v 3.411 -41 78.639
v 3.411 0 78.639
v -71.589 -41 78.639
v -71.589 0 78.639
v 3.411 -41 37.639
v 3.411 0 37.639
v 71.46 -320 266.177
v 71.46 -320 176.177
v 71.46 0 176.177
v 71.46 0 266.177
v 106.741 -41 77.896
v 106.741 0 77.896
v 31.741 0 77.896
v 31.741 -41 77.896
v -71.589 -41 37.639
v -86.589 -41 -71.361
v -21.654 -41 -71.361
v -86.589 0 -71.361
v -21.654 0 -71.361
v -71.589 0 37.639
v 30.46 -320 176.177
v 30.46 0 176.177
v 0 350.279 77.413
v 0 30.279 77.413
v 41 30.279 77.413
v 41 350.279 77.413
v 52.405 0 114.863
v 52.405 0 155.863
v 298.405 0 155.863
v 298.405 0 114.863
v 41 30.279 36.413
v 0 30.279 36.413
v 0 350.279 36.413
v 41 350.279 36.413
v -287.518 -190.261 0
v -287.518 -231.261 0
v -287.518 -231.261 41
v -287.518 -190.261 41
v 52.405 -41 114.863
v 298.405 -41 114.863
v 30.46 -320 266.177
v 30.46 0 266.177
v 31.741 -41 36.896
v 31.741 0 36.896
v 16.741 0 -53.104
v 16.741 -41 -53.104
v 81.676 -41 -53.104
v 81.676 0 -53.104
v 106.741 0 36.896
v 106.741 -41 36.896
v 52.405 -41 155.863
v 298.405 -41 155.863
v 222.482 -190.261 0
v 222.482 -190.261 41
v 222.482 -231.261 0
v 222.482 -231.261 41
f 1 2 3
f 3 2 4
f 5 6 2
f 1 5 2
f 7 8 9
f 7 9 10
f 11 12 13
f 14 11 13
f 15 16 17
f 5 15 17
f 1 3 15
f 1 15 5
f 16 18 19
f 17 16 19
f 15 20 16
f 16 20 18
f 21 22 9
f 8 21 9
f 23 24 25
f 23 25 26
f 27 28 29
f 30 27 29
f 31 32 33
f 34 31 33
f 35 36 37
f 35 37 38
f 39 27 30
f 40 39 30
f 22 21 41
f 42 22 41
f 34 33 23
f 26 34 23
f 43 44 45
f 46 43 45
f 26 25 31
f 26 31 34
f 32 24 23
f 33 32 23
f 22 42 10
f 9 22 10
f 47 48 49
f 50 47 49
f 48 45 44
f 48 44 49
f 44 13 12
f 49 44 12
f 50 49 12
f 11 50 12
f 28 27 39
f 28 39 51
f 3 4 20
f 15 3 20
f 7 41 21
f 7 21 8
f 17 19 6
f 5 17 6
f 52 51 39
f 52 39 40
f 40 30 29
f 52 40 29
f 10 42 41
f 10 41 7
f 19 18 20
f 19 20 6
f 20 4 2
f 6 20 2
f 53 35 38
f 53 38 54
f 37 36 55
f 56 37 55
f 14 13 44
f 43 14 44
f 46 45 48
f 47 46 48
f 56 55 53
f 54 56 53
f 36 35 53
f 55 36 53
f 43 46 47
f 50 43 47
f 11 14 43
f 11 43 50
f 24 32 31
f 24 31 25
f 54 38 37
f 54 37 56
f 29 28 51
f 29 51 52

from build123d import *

# Parameters (mm, degrees)
F1_DEPTH  = 41
F2_W      = 246
F2_H      = 41
F3_DEPTH  = 41
F4_W      = 320
F4_H      = 41
F5_DEPTH  = 41
F6_W      = 510
F6_H      = 41
F7_DEPTH  = 41
F8_W      = 41
F8_H      = 90
F9_DEPTH  = 320
F11_DEPTH = 41


with BuildPart() as f1:
    # F0 (on Front) → F1 (new body)
    with BuildSketch(Plane.XZ):
        Polygon((3.41058, 78.639174), (-71.58942, 78.639174), (-71.58942, 37.639174), (-86.58942, -71.360826), (-21.654289, -71.360826), (3.41058, 37.639174), align=None)
    extrude(amount=F1_DEPTH)


with BuildPart() as f3:
    # F2 (on Front) → F3 (new body)
    with BuildSketch(Plane.XZ):
        with Locations((175.404556, 135.362919)):
            Rectangle(F2_W, F2_H)
    extrude(amount=F3_DEPTH)


with BuildPart() as f5:
    # F4 (on Right) → F5 (new body)
    with BuildSketch(Plane.YZ):
        with Locations((190.279366, 56.91339)):
            Rectangle(F4_W, F4_H)
    extrude(amount=F5_DEPTH)


with BuildPart() as f7:
    # F6 (on Top) → F7 (new body)
    with BuildSketch(Plane.XY):
        with Locations((-32.51787, -210.760753)):
            Rectangle(F6_W, F6_H)
    extrude(amount=F7_DEPTH)


with BuildPart() as f9:
    # F8 (on Front) → F9 (new body)
    with BuildSketch(Plane.XZ):
        with Locations((50.960384, 221.176924)):
            Rectangle(F8_W, F8_H)
    extrude(amount=F9_DEPTH)


with BuildPart() as f11:
    # F10 (on Front) → F11 (new body)
    with BuildSketch(Plane.XZ):
        Polygon((106.740724, 77.89586), (31.740724, 77.89586), (31.740724, 36.89586), (16.740724, -53.10414), (81.675855, -53.10414), (106.740724, 36.89586), align=None)
    extrude(amount=F11_DEPTH)


solid = Compound([f1.part, f3.part, f5.part, f7.part, f9.part, f11.part])
